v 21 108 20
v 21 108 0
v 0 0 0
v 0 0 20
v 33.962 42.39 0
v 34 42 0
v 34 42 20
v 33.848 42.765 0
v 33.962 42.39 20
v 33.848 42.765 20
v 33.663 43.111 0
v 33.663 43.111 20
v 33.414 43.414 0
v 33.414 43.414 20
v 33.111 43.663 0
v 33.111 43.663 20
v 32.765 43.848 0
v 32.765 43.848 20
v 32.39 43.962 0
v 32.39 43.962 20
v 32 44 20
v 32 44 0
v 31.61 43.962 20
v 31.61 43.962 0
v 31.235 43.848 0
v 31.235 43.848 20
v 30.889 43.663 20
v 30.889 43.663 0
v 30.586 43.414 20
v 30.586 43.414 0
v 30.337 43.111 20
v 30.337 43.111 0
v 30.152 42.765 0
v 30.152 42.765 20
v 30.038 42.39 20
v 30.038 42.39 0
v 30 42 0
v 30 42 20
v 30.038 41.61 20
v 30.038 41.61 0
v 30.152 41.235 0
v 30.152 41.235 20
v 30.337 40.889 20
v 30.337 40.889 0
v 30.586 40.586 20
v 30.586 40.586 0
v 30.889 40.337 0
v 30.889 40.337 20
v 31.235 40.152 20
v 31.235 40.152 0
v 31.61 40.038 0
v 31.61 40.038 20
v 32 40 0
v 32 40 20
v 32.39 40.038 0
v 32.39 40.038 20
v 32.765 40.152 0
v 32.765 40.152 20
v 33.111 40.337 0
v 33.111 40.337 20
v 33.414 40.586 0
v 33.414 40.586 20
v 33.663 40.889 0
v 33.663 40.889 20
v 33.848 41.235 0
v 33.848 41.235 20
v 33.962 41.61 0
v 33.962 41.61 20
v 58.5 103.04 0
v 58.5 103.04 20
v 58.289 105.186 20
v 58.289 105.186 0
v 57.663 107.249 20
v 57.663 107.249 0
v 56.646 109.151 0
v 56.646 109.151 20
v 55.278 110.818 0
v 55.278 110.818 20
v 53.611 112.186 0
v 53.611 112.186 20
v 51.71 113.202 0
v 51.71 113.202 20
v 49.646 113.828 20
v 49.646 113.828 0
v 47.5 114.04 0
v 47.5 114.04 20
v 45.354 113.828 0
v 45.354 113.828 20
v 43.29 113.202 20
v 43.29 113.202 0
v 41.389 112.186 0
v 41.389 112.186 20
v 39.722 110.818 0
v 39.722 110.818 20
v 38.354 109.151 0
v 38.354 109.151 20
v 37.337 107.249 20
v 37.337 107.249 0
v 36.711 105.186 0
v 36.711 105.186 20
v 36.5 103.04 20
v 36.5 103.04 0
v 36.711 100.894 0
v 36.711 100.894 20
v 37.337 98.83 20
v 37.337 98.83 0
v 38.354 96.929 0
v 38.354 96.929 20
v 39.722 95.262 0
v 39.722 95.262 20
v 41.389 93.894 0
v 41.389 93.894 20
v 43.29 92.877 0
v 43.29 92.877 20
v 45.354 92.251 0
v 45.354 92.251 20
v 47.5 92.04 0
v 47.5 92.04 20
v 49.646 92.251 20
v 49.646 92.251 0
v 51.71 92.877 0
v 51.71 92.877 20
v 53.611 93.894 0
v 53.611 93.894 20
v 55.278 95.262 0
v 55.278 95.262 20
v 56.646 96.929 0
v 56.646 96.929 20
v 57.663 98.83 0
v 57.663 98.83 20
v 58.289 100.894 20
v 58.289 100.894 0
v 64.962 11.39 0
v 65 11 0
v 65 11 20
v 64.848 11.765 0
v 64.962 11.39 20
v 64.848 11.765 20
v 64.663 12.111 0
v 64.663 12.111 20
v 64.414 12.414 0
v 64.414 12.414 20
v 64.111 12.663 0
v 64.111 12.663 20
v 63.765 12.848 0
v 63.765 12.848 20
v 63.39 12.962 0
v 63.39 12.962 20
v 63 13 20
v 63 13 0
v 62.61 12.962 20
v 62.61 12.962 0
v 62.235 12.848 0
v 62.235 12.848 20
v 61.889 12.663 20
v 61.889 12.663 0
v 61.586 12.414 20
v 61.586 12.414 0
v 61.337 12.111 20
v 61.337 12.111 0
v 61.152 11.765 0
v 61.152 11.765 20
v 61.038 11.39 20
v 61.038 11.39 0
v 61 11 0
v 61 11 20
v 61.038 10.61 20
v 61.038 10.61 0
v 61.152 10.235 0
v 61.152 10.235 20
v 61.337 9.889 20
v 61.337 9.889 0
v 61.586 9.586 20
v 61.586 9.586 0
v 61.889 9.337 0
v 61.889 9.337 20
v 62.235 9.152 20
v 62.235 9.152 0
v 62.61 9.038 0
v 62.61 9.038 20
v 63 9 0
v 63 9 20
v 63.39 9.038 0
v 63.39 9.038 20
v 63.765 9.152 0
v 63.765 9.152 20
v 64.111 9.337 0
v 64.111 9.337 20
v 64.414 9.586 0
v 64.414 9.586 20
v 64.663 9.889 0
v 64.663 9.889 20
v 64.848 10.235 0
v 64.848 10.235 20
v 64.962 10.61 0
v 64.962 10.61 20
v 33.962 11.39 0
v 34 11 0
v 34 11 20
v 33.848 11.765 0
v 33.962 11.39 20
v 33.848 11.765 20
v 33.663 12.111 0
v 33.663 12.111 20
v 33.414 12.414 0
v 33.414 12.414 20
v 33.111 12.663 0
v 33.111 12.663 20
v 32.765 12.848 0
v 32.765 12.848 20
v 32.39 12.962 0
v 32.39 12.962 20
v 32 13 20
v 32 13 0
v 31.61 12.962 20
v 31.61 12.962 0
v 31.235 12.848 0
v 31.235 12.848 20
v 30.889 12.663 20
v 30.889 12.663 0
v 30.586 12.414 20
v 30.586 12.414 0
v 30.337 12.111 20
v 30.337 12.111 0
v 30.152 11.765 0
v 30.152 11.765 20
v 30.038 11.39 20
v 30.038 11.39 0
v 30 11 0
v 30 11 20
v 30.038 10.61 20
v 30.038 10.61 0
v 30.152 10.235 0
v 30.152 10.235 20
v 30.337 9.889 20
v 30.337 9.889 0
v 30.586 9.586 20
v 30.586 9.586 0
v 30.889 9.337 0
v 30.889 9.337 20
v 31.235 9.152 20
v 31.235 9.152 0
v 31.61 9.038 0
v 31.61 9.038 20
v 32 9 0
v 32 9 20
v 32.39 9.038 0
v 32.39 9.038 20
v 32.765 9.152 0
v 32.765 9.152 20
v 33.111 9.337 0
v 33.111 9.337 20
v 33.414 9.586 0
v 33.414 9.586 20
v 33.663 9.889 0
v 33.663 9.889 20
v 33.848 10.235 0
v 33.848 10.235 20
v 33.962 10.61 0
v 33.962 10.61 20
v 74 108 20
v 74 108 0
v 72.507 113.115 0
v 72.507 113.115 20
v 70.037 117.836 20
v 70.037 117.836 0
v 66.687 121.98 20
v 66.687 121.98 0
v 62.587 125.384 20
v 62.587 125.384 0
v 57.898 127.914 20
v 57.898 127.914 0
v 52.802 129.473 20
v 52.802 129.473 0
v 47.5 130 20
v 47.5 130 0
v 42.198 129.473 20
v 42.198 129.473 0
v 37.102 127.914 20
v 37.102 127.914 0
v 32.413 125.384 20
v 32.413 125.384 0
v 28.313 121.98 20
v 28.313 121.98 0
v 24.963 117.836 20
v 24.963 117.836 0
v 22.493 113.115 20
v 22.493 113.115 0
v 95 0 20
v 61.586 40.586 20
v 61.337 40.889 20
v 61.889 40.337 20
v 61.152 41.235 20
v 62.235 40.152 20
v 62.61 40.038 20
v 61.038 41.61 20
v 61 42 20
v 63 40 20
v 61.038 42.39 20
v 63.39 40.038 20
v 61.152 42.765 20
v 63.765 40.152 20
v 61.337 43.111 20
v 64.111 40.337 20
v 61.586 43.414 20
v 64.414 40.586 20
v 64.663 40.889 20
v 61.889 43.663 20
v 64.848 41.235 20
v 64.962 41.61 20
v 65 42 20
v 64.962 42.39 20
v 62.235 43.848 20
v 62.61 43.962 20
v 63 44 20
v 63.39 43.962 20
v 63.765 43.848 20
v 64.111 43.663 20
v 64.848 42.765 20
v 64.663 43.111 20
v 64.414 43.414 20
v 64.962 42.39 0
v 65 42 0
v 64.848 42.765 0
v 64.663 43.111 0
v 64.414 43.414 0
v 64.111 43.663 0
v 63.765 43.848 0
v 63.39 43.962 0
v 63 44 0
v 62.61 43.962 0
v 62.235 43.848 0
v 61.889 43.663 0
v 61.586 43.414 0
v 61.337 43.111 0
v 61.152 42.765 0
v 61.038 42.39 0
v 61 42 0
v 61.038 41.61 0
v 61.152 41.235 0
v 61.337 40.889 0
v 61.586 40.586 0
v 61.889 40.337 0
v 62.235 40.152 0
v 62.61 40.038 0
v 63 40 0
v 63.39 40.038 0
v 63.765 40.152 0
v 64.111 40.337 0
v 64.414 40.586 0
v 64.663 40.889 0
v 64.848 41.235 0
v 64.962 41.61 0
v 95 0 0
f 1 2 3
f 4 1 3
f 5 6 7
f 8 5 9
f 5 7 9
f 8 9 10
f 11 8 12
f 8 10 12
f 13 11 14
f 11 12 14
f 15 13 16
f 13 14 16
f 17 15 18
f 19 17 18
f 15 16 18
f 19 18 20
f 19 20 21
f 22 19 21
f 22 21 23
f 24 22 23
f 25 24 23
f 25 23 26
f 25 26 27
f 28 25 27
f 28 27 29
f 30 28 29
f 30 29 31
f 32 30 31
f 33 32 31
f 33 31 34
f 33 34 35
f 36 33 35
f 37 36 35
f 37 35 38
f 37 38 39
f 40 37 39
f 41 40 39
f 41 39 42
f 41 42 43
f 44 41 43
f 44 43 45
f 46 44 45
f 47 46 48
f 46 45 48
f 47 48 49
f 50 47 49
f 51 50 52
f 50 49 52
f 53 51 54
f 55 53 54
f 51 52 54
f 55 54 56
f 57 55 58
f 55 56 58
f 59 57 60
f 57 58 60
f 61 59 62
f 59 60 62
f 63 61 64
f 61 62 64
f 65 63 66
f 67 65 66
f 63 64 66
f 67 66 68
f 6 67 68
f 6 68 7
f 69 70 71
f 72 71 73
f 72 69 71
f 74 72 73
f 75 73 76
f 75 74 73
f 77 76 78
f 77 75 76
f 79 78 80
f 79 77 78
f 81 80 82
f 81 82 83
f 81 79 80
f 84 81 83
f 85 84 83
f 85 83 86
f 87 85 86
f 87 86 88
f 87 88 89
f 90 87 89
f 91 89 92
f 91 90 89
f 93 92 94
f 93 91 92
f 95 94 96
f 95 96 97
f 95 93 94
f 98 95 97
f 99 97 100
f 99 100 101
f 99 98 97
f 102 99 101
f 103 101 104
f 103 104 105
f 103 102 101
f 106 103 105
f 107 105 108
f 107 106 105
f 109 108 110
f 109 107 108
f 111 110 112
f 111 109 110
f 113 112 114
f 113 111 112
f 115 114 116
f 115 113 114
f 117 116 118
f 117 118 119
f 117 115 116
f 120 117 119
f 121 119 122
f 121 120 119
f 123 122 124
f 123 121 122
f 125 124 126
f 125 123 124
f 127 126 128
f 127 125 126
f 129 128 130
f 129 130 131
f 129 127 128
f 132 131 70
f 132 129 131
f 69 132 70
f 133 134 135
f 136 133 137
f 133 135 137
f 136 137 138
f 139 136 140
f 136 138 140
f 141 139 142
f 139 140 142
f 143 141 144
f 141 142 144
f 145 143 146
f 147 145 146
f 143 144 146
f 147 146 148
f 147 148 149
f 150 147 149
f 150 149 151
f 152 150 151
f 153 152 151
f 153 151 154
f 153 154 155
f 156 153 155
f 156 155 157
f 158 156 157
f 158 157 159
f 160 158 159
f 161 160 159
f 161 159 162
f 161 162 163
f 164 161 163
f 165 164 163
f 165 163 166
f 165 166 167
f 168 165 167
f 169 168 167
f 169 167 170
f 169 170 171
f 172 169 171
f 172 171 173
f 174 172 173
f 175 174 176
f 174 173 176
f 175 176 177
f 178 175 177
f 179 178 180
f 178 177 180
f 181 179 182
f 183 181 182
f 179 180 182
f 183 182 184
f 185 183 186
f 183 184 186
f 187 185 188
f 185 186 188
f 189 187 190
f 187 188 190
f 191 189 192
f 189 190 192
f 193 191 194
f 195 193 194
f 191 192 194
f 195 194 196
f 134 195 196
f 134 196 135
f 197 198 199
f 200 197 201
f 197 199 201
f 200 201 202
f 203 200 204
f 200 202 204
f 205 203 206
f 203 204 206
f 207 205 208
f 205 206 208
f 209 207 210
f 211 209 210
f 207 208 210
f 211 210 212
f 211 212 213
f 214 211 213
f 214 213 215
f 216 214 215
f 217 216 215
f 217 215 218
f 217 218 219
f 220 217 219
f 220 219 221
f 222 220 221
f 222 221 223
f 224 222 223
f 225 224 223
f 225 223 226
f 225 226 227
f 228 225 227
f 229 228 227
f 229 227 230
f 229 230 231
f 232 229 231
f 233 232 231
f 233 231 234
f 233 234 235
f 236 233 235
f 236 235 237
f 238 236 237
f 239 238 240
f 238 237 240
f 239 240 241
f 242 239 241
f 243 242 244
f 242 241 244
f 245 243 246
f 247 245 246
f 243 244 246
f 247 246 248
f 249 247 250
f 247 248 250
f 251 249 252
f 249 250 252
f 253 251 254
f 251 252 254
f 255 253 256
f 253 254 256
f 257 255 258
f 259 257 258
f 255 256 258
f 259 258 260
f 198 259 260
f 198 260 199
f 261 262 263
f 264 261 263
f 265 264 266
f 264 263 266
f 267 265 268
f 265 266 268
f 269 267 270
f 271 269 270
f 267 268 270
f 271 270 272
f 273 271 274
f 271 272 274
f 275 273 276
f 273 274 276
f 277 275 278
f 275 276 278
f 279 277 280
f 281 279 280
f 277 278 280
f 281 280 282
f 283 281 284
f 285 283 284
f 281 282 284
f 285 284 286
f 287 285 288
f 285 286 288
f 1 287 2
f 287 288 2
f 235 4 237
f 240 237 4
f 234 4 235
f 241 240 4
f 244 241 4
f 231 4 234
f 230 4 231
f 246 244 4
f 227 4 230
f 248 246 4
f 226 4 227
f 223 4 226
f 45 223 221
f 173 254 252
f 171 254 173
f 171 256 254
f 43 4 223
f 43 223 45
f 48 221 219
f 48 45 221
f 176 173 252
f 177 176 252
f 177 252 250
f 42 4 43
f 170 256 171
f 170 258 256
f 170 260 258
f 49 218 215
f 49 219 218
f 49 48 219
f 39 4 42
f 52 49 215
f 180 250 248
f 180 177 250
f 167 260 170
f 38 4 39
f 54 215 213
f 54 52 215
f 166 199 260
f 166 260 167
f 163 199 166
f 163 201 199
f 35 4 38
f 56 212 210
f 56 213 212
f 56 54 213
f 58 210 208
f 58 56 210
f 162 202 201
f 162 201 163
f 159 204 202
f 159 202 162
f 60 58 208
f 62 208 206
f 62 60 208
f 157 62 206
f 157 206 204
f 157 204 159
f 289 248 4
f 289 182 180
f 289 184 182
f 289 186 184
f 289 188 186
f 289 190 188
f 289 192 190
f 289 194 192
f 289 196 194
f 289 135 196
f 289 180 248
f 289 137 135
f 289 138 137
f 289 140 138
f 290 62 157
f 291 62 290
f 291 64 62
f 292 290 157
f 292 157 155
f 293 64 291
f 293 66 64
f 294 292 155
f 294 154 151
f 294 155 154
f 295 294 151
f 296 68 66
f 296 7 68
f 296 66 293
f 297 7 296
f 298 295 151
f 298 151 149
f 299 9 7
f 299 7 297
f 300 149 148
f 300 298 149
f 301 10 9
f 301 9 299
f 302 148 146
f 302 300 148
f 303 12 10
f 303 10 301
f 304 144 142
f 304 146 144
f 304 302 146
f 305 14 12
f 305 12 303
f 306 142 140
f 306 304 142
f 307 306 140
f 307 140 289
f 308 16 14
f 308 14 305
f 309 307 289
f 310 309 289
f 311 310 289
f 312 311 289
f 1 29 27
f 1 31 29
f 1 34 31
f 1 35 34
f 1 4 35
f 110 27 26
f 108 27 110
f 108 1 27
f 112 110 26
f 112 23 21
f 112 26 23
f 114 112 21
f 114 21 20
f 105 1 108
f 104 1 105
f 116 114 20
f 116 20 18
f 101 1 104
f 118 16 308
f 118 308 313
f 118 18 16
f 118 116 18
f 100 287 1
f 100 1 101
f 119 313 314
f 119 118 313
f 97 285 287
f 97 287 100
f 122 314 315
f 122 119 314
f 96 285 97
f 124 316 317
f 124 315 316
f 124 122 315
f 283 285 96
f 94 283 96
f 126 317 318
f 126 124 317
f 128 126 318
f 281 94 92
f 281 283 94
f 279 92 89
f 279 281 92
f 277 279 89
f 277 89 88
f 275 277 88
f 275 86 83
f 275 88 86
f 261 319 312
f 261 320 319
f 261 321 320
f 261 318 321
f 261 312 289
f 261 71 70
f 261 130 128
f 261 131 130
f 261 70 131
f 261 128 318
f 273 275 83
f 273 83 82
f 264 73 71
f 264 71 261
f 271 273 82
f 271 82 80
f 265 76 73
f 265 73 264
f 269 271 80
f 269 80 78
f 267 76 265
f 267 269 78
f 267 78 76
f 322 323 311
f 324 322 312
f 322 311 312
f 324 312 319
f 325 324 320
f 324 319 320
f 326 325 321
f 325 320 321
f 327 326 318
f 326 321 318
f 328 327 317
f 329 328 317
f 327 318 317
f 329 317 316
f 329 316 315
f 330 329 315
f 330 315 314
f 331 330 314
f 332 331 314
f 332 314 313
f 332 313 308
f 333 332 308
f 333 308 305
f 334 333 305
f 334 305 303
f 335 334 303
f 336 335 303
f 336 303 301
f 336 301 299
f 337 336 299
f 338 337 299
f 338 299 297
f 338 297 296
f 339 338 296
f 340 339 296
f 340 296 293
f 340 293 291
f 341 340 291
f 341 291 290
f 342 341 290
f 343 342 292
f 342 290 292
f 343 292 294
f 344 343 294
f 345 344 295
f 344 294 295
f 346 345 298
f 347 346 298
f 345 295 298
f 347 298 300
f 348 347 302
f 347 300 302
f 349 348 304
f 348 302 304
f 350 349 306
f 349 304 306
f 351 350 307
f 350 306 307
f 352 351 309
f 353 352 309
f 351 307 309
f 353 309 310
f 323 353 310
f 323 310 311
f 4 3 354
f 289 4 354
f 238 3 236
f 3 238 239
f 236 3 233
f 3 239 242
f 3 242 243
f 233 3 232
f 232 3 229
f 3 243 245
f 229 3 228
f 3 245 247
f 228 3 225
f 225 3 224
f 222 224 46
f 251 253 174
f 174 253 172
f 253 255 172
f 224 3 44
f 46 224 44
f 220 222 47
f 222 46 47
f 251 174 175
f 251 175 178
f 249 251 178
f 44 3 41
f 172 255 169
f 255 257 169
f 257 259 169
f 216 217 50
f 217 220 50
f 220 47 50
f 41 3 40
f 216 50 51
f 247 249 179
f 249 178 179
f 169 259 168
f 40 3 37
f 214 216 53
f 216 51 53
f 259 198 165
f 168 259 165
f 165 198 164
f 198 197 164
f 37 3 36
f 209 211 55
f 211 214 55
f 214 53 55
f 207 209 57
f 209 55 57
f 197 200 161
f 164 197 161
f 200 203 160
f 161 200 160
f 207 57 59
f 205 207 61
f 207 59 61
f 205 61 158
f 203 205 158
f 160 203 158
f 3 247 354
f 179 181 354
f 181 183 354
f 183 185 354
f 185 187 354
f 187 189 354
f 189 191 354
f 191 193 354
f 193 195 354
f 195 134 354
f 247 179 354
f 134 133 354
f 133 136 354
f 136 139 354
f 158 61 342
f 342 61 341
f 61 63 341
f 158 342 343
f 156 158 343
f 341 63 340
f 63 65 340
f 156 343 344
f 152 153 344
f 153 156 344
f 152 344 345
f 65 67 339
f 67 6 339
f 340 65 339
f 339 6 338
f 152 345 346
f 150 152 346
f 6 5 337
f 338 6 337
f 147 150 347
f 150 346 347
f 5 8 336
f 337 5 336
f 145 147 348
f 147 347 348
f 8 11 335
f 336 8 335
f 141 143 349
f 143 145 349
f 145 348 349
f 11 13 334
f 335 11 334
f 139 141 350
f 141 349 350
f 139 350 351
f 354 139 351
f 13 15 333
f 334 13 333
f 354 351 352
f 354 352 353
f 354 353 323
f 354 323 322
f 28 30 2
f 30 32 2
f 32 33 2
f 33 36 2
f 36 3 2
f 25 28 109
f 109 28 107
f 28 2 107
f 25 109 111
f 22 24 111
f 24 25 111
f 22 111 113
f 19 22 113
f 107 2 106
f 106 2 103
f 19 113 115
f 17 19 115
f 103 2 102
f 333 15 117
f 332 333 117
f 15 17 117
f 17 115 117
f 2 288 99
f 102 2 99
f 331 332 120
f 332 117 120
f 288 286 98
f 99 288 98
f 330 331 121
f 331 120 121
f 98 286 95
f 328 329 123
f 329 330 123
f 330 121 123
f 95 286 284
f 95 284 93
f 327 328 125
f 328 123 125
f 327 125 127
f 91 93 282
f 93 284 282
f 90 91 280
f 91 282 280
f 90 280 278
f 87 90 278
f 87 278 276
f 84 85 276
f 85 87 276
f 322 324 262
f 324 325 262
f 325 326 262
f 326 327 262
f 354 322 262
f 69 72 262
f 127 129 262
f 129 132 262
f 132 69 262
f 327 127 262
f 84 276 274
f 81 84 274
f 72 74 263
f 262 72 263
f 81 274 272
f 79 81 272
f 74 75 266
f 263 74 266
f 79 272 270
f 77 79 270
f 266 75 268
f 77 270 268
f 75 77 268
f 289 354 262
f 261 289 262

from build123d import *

# Parameters (mm, degrees)
ESQUISSE1_R             = 11
BOSS_EXTRU_1_DEPTH      = 20
ESQUISSE2_R             = 2
ENL_V_MAT_EXTRU_1_DEPTH = 163.249807396


with BuildPart() as part:
    # Esquisse1 → Boss.-Extru.1 (new body)
    with BuildSketch(Plane.XY):
        with BuildLine():
            Line((0, 0), (95, 0))
            Line((95, 0), (74, 108))
            ThreePointArc((74, 108), (47.5, 130), (21, 108))
            Line((21, 108), (0, 0))
        make_face()
        with Locations((47.5, 103.039772727)):
            Circle(ESQUISSE1_R, mode=Mode.SUBTRACT)
    extrude(amount=BOSS_EXTRU_1_DEPTH)

    # Esquisse2 → Enlèv. mat.-Extru.1 (cut, through all)
    with BuildSketch(Plane.XY.offset(20)):
        with Locations((63, 11)):
            Circle(ESQUISSE2_R)
        with Locations((32, 11)):
            Circle(ESQUISSE2_R)
        with Locations((32, 42)):
            Circle(ESQUISSE2_R)
        with Locations((63, 42)):
            Circle(ESQUISSE2_R)
    extrude(amount=-ENL_V_MAT_EXTRU_1_DEPTH, mode=Mode.SUBTRACT)


solid = part.part
